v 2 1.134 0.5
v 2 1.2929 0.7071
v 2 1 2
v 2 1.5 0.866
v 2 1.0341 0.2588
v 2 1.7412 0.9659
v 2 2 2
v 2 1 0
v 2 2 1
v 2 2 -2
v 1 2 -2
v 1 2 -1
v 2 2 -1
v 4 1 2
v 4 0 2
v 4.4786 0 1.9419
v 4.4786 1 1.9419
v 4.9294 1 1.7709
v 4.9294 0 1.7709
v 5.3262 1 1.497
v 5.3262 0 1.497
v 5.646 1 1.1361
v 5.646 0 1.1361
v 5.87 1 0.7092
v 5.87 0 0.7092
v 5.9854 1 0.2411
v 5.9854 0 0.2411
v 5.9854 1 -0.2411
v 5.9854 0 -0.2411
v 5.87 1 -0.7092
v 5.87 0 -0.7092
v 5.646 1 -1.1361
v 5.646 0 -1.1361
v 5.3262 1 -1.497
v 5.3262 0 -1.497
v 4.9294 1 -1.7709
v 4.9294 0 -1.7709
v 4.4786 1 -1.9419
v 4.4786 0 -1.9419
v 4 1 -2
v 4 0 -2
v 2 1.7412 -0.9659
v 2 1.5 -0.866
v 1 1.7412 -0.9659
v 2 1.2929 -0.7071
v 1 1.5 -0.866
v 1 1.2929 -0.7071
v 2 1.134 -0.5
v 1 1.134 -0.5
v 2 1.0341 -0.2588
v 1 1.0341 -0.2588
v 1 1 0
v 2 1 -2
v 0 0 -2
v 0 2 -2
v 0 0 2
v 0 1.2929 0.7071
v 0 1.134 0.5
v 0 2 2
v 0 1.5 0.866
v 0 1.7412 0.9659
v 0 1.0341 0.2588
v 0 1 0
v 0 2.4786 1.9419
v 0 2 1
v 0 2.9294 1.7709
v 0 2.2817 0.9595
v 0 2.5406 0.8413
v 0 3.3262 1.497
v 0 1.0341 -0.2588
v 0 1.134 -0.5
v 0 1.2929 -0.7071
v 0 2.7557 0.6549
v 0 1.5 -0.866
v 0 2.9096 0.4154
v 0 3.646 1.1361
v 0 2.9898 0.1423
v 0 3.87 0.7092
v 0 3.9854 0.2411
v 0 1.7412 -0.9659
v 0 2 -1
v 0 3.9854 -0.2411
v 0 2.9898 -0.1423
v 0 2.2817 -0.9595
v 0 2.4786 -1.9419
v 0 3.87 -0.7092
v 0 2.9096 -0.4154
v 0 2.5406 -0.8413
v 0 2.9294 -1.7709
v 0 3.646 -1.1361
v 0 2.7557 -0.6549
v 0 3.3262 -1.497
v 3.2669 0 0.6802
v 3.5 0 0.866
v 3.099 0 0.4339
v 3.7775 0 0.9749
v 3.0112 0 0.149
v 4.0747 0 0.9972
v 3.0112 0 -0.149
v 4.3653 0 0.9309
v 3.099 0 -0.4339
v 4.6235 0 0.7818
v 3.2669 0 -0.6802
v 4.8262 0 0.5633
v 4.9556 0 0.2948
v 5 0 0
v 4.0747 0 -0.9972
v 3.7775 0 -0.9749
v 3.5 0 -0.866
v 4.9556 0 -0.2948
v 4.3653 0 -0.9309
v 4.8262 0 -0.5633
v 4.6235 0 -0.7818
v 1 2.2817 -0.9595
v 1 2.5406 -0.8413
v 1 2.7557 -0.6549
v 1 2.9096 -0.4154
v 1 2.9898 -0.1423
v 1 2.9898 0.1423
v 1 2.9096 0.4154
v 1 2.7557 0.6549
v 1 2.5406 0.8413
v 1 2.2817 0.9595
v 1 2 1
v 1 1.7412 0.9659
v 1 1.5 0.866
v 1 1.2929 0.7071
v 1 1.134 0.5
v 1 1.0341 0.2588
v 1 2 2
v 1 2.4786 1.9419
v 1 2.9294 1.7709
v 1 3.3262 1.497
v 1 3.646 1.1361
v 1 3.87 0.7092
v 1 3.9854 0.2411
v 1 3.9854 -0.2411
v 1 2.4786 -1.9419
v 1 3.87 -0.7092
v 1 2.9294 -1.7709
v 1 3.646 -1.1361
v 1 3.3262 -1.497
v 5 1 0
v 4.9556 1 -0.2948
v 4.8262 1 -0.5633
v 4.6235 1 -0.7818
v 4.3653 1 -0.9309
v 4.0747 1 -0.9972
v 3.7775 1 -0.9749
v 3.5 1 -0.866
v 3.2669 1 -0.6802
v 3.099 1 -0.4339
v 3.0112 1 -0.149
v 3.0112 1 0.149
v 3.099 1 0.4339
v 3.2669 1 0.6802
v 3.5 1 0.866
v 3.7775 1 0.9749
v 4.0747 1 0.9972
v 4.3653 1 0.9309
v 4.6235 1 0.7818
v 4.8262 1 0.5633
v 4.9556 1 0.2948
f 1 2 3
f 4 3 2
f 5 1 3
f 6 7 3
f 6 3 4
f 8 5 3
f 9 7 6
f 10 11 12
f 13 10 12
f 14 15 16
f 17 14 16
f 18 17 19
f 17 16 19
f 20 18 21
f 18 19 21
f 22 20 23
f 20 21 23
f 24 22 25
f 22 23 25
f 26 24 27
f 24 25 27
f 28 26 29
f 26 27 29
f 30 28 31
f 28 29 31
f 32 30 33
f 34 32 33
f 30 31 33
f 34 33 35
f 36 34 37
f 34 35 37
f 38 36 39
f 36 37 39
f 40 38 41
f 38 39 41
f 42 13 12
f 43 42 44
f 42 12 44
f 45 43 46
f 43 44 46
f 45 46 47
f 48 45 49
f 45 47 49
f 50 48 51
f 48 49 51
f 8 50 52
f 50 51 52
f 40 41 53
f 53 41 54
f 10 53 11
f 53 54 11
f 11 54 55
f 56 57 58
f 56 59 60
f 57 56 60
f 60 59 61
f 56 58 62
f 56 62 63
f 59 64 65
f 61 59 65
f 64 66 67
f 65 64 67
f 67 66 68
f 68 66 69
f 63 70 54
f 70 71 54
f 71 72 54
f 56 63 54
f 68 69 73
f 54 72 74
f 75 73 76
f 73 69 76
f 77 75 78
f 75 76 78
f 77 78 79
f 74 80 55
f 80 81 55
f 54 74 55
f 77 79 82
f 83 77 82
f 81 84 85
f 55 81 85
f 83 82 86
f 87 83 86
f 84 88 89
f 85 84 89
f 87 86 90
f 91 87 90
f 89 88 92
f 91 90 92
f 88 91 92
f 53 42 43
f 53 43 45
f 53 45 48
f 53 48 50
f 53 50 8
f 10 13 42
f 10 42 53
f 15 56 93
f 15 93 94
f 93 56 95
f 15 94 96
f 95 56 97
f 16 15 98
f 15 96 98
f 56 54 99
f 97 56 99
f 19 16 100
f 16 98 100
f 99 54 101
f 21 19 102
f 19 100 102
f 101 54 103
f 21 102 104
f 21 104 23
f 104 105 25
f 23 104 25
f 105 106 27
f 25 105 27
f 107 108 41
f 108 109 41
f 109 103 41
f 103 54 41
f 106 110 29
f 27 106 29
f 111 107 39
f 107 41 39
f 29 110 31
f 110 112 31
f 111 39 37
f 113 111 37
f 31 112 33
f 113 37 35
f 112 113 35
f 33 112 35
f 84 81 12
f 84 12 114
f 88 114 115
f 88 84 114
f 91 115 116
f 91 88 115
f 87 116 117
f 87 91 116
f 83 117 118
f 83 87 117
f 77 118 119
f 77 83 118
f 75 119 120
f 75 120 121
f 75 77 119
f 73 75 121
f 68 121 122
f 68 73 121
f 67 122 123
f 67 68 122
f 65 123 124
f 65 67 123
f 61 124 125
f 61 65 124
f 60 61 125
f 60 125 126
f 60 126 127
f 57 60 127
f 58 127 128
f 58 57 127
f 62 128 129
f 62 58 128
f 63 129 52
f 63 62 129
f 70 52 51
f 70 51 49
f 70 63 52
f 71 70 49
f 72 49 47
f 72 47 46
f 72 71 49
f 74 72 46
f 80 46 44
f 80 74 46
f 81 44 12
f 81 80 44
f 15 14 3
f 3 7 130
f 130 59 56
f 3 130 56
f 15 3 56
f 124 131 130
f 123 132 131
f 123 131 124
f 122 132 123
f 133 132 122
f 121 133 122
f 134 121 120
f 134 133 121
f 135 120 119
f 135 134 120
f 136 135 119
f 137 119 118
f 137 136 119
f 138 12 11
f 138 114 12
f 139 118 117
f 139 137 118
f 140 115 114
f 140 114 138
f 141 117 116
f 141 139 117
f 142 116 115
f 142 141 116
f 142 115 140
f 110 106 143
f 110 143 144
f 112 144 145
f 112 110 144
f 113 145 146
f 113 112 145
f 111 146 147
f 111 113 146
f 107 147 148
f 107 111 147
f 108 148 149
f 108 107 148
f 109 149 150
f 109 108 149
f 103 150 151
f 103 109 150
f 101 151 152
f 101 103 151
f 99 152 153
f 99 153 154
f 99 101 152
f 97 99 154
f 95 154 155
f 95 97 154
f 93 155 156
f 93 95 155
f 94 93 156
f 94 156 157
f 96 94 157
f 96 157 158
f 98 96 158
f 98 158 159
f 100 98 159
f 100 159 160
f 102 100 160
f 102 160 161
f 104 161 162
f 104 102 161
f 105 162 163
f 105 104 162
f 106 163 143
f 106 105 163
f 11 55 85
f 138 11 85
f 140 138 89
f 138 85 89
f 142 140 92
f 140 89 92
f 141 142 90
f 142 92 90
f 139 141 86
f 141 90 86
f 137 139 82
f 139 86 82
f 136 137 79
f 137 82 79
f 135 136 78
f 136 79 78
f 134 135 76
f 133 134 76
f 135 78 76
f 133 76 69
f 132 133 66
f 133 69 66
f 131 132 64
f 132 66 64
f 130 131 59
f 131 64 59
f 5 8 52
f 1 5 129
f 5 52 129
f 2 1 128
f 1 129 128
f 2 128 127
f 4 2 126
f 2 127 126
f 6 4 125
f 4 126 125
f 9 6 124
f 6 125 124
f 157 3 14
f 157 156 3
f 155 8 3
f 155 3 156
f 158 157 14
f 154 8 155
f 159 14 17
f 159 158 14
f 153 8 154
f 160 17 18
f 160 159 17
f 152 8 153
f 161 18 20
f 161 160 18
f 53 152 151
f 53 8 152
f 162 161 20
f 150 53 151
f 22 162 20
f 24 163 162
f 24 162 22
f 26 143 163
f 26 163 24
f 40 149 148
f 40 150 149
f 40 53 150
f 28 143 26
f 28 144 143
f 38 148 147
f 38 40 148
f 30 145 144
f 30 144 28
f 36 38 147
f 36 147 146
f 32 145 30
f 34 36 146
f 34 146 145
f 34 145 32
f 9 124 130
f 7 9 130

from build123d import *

# Parameters (mm, degrees)
SKETCH_1_R      = 1
EXTRUDE_1_DEPTH = 1
SKETCH_2_R      = 1
EXTRUDE_3_DEPTH = 1
EXTRUDE_4_DEPTH = 2


with BuildPart() as part:
    # 草圖1 → 填料-伸長1 (new body)
    with BuildSketch(Plane(origin=(0, 0, 0), x_dir=(1, 0, 0), z_dir=(0, 1, 0))):
        with BuildLine():
            Line((4, 2), (0, 2))
            Line((0, 2), (0, -2))
            Line((0, -2), (4, -2))
            ThreePointArc((4, -2), (6, 0), (4, 2))
        make_face()
        with Locations((4, 0)):
            Circle(SKETCH_1_R, mode=Mode.SUBTRACT)
    extrude(amount=EXTRUDE_1_DEPTH)

    # 草圖2 → 填料-伸長3 (add)
    with BuildSketch(Plane(origin=(0, 0, 0), x_dir=(0, 0, -1), z_dir=(1, 0, 0))):
        with BuildLine():
            Line((-2, 2), (-2, 0))
            Line((-2, 0), (2, 0))
            Line((2, 0), (2, 2))
            ThreePointArc((2, 2), (0, 4), (-2, 2))
        make_face()
        with Locations((0, 2)):
            Circle(SKETCH_2_R, mode=Mode.SUBTRACT)
    extrude(amount=EXTRUDE_3_DEPTH)

    # 草圖2<4> → 填料-伸長4 (add)
    with BuildSketch(Plane(origin=(0, 0, 0), x_dir=(0, 0, -1), z_dir=(1, 0, 0))):
        with BuildLine():
            Line((-1, 2), (-2, 2))
            Line((-2, 2), (-2, 0))
            Line((-2, 0), (2, 0))
            Line((2, 0), (2, 2))
            Line((2, 2), (1, 2))
            ThreePointArc((1, 2), (0, 1), (-1, 2))
        make_face()
    extrude(amount=EXTRUDE_4_DEPTH)


solid = part.part
